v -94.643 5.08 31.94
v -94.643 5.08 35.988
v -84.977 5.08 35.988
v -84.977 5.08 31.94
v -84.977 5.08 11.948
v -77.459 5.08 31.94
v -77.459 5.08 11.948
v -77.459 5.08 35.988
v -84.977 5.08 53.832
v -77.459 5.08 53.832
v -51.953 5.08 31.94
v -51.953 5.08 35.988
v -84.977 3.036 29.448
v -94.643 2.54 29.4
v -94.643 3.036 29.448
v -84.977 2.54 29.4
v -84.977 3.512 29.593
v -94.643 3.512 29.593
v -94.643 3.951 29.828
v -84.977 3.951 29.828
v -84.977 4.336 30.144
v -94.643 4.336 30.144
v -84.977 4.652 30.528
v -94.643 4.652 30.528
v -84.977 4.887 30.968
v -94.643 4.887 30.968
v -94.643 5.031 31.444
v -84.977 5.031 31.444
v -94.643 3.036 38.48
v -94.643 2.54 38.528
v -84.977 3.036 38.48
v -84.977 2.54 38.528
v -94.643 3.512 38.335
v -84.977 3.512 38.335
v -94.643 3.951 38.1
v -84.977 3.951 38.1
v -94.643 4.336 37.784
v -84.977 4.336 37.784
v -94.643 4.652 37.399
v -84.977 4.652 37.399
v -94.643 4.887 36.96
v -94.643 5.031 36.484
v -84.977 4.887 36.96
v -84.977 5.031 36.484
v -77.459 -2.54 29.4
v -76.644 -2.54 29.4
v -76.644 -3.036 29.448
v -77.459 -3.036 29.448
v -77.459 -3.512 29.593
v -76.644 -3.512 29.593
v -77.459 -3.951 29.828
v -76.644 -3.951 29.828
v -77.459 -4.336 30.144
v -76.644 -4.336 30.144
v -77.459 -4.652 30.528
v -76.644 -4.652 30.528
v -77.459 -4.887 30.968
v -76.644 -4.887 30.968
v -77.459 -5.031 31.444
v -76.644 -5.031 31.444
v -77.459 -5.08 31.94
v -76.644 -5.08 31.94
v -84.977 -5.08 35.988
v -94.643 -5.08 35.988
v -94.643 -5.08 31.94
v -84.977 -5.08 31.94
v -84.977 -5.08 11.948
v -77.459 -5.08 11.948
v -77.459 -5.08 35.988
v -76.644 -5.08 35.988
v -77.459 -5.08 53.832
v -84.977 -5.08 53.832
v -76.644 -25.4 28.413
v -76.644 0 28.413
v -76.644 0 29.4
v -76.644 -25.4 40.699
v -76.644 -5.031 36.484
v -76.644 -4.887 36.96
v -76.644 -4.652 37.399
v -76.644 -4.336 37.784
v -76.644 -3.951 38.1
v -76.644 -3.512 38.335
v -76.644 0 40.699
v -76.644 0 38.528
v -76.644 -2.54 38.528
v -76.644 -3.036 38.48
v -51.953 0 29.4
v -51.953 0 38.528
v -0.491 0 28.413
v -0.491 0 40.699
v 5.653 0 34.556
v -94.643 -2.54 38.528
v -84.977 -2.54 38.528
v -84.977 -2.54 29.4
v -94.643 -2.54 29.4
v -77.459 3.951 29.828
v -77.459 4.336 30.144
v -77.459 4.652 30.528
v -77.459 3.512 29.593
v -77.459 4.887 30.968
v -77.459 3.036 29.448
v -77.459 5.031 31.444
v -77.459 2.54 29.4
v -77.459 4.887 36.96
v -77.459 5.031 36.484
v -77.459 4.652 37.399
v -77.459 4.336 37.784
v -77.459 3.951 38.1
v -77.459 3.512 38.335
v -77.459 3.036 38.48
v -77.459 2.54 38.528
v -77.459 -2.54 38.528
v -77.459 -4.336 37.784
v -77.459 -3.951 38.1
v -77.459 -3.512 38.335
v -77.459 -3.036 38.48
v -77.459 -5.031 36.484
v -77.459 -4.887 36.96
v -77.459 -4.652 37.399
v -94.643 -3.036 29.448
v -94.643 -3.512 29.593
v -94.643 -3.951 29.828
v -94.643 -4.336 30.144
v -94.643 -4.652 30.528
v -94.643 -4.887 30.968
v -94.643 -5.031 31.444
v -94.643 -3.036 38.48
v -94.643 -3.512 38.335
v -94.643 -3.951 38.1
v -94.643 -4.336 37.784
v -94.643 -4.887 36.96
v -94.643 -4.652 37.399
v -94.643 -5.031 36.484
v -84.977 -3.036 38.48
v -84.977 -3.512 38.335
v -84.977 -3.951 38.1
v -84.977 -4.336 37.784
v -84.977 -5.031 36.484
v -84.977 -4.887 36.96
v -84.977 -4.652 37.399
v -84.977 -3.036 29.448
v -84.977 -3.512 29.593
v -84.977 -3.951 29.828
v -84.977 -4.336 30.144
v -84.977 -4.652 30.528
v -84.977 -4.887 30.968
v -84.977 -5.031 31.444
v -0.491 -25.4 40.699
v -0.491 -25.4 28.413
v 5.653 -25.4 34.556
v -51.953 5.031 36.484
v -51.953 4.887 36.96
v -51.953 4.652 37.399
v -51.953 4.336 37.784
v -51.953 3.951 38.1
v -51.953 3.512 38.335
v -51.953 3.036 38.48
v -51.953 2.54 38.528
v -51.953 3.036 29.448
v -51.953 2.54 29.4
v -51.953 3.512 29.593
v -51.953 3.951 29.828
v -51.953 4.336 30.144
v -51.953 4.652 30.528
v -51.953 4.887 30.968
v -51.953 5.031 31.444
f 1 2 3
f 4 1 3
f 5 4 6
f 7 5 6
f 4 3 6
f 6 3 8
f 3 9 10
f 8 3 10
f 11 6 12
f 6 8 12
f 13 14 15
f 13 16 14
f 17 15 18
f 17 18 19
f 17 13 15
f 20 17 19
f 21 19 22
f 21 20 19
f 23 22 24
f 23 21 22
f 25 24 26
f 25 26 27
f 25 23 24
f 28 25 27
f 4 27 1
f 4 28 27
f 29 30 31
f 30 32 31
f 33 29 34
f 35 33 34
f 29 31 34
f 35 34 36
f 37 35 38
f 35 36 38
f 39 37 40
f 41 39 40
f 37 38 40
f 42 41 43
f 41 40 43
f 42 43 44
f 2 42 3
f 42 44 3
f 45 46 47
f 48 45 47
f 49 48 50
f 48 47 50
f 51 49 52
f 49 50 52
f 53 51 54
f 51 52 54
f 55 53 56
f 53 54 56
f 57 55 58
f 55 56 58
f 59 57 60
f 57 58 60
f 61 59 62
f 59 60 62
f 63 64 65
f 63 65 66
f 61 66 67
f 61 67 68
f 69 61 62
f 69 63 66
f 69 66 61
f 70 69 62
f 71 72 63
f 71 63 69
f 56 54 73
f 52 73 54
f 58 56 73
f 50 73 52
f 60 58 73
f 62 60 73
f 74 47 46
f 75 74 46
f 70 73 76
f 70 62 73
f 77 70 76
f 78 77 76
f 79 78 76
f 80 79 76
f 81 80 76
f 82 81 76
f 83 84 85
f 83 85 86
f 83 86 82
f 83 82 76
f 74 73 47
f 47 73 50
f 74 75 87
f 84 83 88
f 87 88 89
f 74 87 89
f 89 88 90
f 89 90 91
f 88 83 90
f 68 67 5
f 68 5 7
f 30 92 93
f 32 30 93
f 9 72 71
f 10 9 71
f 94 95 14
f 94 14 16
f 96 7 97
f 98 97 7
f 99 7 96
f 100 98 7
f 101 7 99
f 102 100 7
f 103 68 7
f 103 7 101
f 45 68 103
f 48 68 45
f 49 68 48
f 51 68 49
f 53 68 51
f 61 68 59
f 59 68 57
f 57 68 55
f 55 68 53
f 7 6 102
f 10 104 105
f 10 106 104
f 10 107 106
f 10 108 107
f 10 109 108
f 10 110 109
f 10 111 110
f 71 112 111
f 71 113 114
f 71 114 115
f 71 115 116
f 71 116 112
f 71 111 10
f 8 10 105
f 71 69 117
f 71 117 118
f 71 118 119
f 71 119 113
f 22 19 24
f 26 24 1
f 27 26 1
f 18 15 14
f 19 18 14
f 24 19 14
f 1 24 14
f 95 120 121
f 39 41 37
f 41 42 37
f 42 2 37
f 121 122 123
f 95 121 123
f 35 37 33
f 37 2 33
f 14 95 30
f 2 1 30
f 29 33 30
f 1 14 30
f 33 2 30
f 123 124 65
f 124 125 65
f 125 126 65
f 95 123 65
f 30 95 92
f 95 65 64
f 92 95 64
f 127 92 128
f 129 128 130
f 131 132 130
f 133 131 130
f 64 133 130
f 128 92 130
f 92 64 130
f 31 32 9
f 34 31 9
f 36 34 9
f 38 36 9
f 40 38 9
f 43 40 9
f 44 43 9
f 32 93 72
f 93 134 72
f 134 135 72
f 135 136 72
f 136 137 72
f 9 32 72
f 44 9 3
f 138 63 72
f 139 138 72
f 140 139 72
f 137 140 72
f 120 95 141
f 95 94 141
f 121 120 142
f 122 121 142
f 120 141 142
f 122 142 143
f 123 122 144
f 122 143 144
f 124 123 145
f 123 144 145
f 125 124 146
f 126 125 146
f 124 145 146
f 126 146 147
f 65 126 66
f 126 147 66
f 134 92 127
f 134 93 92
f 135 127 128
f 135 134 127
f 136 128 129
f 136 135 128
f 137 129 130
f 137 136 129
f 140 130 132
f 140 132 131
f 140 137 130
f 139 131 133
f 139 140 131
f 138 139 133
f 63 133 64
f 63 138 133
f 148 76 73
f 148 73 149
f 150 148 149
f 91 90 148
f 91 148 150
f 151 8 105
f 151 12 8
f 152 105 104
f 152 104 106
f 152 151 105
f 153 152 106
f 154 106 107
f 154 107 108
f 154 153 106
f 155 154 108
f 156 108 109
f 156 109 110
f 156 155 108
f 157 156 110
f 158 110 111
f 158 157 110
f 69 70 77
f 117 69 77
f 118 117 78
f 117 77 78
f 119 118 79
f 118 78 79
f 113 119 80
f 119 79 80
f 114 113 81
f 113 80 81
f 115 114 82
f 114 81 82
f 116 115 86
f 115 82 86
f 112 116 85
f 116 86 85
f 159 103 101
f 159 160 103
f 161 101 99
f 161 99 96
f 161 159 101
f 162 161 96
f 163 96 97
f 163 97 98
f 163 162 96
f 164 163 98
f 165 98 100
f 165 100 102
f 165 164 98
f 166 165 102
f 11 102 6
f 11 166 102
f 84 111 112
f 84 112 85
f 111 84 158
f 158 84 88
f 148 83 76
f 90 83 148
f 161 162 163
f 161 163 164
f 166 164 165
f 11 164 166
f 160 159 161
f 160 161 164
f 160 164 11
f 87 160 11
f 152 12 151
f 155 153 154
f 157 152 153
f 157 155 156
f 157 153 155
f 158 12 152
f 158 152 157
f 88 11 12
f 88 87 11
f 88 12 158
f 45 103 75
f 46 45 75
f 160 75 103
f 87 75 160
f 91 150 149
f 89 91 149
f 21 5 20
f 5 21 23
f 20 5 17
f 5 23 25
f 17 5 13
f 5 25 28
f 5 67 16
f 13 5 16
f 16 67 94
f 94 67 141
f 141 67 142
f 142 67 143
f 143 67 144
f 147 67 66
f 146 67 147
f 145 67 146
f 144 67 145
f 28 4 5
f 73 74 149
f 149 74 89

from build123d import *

# Parameters (mm, degrees)
F0_W        = 25.5065411329
F0_H        = 9.1286599636
F0_W_2      = 9.6656344831
F0_W_3      = 7.5177252293
F0_H_2      = 15.3039256111
F0_H_3      = 17.4518460408
F1_DEPTH    = 5.08
F2_R        = 2.54
F3_R        = 2.54
F4_W        = 86.313597858
F4_H        = 12.2866295278
F5_DEPTH    = 25.4
F6_T1_DEPTH = 77.6565983155


# Not quite as in the source:
# - a fillet or chamfer that OpenCascade refuses, or shapes differently, is made with other operations: its cross-section is extruded or revolved along the edge and cut away or added


with BuildPart() as f1:
    # F0 (on Front) → F1 (new body, symmetric)
    with BuildSketch(Plane.XZ):
        with Locations((-64.7060722113, 33.9639782906)):
            Rectangle(F0_W, F0_H)
        with Locations((-89.8098852485, 33.9639782906)):
            Rectangle(F0_W_2, F0_H)
        with Locations((-81.2182053924, 46.1802710779)):
            Rectangle(F0_W_3, F0_H_2)
        with Locations((-81.2182053924, 33.9639782906)):
            Rectangle(F0_W_3, F0_H)
        with Locations((-81.2182053924, 20.6737252884)):
            Rectangle(F0_W_3, F0_H_3)
    extrude(amount=F1_DEPTH, both=True)

    # F2
    f2_edges = [f1.edges().sort_by_distance(p)[0] for p in [
        (-64.706072, -5.08, 38.528308),
        (-89.809885, -5.08, 38.528308),
    ]]
    fillet(f2_edges, radius=F2_R)

    # F3
    f3_edges = [f1.edges().sort_by_distance(p)[0] for p in [
        (-64.706072, -5.08, 29.399648),
        (-89.809885, -5.08, 29.399648),
        (-89.809885, 5.08, 29.399648),
        (-64.706072, 5.08, 29.399648),
        (-64.706072, 5.08, 38.528308),
        (-89.809885, 5.08, 38.528308),
    ]]
    fillet(f3_edges, radius=F3_R)

    # F4 (on Front) → F5 (join)
    with BuildSketch(Plane.XZ):
        with Locations((-33.4874503314, 34.556152299)):
            Rectangle(F4_W, F4_H)
    extrude(amount=F5_DEPTH)

    # F6: chamfer of 10.16 on 2 edges, made by hand

    # F6_s2 → F6_t1 (cut)
    with BuildSketch(Plane.XZ.offset(-26.1282991577)):
        Polygon((-0.4906514025, 40.699467063), (9.6693485975, 30.539467063), (9.6693485975, 40.699467063), align=None)
        Polygon((9.6693485975, 38.5728375351), (-0.4906514025, 28.4128375351), (9.6693485975, 28.4128375351), align=None)
    extrude(amount=F6_T1_DEPTH, mode=Mode.SUBTRACT)


solid = f1.part
